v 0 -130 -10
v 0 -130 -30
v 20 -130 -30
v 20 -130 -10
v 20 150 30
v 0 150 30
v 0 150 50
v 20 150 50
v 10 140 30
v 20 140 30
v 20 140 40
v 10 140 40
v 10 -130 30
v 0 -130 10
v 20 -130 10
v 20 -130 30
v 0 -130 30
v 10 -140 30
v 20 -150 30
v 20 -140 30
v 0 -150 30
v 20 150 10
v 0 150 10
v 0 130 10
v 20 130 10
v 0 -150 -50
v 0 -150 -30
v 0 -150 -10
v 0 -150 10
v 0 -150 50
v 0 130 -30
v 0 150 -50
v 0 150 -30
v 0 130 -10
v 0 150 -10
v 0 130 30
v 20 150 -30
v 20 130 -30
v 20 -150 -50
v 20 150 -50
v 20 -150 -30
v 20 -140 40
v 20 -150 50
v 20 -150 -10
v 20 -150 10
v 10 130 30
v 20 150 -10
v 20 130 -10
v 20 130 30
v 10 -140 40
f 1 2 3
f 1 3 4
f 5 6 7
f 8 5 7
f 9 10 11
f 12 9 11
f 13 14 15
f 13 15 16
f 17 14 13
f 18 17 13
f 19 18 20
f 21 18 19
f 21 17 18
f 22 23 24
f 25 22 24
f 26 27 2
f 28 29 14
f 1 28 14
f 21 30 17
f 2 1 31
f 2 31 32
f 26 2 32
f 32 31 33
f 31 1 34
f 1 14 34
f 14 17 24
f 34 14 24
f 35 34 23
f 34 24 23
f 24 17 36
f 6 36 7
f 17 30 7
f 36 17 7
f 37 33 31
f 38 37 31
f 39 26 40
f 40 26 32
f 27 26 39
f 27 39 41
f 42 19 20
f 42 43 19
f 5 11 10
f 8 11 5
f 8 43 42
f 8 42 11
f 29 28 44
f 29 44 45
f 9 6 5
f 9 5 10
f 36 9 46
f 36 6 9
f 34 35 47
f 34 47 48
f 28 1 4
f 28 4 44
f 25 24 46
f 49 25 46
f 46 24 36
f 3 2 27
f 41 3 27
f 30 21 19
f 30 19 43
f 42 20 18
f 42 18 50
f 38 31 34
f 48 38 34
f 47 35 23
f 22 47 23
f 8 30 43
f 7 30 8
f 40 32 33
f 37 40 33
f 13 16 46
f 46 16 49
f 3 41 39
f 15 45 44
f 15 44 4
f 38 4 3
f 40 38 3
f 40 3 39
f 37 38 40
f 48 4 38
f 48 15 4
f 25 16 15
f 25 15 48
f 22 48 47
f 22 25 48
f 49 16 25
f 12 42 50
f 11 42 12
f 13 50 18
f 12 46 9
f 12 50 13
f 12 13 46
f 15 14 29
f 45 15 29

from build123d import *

# Parameters (mm, degrees)
F0_W     = 300
F0_H     = 100
F1_DEPTH = 20
F2_W     = 20
F2_H     = 20
F3_DEPTH = 20
F4_W     = 280
F4_H     = 10
F5_DEPTH = 10


with BuildPart() as f1:
    # F0 (on Right) → F1 (new body)
    with BuildSketch(Plane.YZ):
        Rectangle(F0_W, F0_H)
    extrude(amount=F1_DEPTH)

    # F2 (on face) → F3 (cut, through all)
    with BuildSketch(Plane(origin=(0, 0, 0), x_dir=(0, -1, 0), z_dir=(-1, 0, 0))):
        with Locations((140, -20)):
            Rectangle(F2_W, F2_H)
        with Locations((-140, -20)):
            Rectangle(F2_W, F2_H)
        with Locations((140, 20)):
            Rectangle(F2_W, F2_H)
        with Locations((-140, 20)):
            Rectangle(F2_W, F2_H)
    extrude(amount=-F3_DEPTH, mode=Mode.SUBTRACT)

    # F4 (on face) → F5 (cut)
    with BuildSketch(Plane.YZ.offset(20)):
        with Locations((0, 35)):
            Rectangle(F4_W, F4_H)
    extrude(amount=-F5_DEPTH, mode=Mode.SUBTRACT)


solid = f1.part
